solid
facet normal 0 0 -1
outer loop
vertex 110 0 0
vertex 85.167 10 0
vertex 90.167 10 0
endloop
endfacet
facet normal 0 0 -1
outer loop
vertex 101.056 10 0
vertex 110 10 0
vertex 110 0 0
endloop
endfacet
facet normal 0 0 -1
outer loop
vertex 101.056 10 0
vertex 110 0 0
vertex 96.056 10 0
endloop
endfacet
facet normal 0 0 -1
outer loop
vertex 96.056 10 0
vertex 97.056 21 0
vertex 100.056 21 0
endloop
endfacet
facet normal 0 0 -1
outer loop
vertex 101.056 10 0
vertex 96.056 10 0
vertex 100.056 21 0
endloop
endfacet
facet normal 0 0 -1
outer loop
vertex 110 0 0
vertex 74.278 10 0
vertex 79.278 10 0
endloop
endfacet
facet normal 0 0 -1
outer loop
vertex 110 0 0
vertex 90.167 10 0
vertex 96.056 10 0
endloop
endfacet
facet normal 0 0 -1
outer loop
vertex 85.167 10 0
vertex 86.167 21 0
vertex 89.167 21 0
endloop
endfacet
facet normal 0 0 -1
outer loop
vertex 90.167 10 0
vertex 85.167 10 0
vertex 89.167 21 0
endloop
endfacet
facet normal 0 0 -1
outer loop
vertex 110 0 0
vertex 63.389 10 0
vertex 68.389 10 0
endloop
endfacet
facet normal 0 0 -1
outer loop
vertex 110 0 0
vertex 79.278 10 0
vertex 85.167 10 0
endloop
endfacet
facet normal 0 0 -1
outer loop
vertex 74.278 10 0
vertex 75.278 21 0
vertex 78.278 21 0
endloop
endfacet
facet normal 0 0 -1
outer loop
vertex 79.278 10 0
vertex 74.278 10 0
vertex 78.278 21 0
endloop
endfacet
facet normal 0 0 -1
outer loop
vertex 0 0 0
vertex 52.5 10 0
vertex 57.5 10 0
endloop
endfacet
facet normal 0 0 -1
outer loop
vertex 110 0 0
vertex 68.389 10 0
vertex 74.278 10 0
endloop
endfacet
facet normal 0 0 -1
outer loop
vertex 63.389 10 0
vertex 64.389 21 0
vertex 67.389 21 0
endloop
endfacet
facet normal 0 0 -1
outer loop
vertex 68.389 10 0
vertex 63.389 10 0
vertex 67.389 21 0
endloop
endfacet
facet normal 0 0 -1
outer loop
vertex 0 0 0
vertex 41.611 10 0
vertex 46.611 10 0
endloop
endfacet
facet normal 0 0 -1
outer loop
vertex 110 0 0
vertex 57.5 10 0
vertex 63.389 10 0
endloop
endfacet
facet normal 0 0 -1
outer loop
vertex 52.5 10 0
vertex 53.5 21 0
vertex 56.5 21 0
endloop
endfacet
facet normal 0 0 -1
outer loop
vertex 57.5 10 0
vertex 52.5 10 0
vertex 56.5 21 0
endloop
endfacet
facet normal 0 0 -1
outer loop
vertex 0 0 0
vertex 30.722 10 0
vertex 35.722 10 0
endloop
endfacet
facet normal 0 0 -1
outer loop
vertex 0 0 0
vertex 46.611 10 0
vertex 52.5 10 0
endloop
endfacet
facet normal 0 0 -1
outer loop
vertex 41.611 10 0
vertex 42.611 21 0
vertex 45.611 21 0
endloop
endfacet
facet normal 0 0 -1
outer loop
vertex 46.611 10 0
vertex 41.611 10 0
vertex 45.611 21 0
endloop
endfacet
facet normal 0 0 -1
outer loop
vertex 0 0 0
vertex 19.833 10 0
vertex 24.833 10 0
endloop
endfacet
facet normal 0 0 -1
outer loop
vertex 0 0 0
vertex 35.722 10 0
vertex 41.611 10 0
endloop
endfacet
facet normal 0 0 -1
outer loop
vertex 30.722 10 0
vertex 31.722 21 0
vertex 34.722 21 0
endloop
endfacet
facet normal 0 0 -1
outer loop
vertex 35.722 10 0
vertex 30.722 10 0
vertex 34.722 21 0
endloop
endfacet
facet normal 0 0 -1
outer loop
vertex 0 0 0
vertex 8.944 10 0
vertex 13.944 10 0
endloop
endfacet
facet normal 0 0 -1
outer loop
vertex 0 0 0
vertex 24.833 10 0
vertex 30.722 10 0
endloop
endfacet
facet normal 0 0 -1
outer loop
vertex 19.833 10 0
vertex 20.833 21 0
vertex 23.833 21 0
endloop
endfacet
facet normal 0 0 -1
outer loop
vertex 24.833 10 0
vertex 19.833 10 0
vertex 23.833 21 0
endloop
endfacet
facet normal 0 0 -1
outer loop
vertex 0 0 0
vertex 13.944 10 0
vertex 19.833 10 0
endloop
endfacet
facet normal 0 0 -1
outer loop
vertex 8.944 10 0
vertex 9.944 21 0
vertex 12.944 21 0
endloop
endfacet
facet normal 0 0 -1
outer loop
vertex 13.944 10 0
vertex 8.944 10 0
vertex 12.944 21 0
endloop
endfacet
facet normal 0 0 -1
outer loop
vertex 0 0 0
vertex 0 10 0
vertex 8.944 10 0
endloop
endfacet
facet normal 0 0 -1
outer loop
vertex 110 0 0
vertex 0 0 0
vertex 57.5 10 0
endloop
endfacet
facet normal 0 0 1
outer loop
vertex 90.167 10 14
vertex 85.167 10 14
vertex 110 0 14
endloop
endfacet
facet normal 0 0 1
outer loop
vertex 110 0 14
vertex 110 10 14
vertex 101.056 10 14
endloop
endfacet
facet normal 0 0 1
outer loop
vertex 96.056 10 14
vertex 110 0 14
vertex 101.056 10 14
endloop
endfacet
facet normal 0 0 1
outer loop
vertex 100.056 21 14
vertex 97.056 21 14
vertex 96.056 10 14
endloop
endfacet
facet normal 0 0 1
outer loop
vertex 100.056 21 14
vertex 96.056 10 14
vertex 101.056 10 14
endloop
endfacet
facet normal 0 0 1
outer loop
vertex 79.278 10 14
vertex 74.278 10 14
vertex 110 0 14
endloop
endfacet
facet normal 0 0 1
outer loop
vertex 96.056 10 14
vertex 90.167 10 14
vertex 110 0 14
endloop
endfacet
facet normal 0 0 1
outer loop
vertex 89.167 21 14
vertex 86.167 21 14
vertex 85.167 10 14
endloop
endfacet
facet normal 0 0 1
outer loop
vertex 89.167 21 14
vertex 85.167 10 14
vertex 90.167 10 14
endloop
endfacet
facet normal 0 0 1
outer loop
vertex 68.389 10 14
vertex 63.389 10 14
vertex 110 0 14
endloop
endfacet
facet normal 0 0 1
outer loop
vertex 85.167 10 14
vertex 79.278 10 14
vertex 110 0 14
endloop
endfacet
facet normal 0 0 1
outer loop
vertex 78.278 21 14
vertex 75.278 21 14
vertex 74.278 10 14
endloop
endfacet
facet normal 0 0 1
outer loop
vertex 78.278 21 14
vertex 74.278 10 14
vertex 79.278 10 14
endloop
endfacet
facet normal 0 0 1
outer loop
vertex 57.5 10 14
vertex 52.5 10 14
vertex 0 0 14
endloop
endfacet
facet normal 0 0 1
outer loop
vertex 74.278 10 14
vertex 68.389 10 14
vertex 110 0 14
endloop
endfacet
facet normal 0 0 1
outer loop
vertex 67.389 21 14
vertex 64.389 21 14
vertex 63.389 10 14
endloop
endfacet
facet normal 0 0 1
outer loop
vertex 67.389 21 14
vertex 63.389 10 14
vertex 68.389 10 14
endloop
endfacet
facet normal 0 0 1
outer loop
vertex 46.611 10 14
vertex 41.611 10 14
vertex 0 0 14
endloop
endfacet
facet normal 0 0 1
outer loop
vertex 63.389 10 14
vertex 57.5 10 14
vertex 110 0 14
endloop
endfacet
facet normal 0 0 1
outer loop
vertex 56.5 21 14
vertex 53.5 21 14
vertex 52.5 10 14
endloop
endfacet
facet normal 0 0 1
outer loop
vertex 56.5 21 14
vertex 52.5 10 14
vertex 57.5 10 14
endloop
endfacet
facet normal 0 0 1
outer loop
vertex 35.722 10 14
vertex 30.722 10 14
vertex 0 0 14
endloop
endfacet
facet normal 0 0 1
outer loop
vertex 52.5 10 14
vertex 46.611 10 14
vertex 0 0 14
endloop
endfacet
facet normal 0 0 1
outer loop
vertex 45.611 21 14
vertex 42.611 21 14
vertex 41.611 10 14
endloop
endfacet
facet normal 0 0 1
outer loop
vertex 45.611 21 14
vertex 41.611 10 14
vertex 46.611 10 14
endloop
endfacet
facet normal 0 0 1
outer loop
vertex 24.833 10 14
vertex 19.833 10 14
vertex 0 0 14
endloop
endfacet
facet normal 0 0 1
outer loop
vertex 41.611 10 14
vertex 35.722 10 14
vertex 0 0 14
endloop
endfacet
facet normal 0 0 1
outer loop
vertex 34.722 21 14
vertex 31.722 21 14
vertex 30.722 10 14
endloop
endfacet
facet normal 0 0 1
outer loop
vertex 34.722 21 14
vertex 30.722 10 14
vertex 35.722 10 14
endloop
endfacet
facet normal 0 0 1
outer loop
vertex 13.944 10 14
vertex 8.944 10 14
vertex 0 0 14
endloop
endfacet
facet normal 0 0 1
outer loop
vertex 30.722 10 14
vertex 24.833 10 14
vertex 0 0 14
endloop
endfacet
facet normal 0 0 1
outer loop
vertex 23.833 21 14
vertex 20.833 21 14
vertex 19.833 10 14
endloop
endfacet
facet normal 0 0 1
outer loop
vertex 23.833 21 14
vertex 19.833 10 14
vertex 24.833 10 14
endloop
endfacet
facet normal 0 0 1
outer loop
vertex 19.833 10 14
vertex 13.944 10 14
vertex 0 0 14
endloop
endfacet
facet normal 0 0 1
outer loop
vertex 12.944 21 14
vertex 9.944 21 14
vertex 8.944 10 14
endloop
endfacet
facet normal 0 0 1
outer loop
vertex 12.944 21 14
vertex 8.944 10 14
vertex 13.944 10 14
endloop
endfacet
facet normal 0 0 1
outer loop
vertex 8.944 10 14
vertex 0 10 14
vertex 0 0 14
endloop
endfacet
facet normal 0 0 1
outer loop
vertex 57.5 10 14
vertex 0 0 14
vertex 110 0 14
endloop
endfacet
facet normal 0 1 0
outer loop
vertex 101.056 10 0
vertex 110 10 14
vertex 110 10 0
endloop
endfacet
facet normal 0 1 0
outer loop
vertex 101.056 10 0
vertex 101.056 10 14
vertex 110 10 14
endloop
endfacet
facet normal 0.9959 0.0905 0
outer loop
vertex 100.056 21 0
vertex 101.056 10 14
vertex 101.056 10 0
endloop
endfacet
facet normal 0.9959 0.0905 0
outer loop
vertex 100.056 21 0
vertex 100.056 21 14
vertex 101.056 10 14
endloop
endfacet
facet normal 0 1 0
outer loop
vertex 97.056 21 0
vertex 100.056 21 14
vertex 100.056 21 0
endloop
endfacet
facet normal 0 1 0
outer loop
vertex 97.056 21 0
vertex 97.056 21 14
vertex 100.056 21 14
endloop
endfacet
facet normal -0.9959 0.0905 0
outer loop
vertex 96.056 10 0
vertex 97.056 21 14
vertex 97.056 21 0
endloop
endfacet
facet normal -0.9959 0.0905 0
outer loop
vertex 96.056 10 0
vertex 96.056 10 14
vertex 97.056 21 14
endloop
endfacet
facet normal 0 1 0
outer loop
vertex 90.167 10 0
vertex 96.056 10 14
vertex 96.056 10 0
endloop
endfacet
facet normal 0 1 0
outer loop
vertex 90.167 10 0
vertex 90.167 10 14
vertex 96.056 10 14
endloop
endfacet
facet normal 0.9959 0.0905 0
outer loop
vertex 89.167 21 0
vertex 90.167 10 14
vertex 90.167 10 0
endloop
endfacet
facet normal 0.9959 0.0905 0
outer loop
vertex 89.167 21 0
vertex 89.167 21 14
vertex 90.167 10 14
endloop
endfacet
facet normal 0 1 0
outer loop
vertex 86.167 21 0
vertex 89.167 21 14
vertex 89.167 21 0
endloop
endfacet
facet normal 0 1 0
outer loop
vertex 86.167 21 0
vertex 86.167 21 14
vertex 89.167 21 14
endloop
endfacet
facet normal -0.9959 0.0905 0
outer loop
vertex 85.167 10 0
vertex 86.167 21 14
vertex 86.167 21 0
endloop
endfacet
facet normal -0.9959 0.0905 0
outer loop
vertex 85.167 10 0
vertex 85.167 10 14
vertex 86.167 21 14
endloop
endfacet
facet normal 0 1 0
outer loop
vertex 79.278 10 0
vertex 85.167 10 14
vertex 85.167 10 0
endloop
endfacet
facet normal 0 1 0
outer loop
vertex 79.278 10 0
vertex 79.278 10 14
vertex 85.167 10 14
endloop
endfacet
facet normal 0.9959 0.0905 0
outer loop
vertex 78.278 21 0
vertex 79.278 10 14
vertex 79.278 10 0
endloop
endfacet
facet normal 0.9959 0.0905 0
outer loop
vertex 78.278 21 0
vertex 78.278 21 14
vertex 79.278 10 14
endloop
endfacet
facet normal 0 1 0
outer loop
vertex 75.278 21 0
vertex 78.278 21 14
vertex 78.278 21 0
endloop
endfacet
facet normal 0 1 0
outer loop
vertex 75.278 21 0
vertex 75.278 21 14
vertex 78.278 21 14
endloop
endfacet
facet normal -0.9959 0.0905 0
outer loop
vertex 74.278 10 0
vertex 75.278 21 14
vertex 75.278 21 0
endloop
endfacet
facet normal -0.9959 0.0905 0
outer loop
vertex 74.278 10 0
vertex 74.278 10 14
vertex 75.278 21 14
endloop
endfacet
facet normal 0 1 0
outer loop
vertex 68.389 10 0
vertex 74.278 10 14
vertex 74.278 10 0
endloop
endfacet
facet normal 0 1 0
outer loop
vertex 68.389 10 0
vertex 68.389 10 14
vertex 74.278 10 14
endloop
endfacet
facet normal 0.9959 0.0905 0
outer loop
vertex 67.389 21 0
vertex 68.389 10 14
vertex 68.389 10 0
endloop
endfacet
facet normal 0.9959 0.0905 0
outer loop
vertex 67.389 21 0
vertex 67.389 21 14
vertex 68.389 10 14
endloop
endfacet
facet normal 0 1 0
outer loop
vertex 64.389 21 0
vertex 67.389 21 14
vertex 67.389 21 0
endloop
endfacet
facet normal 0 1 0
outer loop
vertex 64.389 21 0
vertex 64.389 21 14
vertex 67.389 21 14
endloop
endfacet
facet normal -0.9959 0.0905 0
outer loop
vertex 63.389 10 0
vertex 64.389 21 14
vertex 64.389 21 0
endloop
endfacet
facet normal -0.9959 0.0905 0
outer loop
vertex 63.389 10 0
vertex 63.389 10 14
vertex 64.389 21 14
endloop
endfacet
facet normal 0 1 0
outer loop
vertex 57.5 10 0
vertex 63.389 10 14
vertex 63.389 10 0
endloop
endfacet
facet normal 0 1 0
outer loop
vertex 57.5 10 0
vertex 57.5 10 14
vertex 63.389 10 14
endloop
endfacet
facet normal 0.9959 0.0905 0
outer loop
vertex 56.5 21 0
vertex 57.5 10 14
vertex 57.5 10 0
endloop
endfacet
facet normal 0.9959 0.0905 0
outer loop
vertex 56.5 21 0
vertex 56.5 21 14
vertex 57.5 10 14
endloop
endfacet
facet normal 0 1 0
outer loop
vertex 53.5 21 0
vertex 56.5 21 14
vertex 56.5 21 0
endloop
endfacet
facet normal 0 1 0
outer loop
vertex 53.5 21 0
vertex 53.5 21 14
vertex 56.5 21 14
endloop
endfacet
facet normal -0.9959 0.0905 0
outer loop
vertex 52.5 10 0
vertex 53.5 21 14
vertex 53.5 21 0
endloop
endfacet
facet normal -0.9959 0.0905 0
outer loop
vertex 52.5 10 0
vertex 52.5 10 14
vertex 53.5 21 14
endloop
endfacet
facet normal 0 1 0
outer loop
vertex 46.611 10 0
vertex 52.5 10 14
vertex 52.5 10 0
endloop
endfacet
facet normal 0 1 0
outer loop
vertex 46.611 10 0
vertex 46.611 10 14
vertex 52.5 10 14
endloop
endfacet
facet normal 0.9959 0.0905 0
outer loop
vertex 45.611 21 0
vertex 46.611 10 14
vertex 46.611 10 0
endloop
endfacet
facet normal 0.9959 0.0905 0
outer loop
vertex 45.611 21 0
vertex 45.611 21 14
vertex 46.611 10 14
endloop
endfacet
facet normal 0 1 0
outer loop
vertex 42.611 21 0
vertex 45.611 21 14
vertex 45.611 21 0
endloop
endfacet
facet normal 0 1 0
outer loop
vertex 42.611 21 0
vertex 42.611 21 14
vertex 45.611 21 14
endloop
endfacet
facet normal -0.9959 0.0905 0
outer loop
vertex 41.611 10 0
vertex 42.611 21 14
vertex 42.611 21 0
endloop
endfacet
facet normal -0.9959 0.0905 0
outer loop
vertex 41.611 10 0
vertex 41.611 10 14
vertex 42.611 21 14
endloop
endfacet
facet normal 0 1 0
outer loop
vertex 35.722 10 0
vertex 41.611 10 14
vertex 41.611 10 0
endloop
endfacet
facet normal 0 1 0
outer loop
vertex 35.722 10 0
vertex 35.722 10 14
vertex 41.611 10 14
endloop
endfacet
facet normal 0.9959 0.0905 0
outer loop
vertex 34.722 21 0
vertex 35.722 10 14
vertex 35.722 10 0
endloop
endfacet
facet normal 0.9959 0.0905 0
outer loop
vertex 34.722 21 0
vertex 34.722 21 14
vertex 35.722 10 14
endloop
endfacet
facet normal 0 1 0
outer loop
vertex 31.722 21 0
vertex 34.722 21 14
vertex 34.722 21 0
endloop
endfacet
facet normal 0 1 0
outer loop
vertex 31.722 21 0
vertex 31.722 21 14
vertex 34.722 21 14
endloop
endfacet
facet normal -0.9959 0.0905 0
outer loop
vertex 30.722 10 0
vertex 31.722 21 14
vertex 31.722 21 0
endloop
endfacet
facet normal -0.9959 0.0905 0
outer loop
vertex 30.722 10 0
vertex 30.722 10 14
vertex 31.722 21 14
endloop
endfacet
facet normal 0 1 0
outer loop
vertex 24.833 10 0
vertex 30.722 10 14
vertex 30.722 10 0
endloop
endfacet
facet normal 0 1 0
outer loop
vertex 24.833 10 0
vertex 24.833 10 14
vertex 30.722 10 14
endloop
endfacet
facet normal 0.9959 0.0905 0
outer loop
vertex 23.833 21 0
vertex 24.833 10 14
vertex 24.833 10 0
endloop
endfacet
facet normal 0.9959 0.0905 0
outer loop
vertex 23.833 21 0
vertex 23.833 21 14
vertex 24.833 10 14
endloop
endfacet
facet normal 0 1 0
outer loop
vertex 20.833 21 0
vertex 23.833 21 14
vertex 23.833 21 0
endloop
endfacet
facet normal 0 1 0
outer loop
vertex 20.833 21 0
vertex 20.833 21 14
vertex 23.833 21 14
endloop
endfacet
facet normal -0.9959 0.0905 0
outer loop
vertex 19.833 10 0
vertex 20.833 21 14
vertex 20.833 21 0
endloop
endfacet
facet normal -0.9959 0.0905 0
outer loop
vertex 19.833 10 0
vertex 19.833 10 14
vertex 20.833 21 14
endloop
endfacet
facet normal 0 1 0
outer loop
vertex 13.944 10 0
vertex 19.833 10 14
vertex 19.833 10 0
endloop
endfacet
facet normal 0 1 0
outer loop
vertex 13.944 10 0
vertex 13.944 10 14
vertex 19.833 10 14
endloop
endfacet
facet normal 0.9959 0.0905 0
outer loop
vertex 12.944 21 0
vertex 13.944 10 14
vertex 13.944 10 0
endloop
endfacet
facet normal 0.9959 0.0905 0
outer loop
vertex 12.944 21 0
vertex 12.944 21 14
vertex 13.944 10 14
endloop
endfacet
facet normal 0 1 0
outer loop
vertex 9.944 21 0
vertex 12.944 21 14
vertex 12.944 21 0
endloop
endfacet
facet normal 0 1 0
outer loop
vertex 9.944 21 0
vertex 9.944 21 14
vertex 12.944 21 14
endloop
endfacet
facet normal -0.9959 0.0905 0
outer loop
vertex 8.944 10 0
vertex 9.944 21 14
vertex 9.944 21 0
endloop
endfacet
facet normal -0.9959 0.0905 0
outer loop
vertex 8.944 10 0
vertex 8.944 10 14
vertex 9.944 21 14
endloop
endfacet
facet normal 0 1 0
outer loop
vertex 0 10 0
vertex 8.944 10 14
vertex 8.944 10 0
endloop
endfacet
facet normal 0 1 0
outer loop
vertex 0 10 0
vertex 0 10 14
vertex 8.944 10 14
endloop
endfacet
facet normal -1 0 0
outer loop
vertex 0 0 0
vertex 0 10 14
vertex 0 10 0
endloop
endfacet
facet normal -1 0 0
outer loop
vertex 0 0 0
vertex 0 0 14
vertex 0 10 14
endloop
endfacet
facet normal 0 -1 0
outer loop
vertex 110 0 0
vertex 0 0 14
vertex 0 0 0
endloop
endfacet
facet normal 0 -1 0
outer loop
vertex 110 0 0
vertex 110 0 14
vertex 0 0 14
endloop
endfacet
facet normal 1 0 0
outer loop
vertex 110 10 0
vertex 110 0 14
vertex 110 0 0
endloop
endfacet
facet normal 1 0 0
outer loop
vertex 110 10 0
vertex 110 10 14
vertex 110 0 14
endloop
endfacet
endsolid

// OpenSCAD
$fn = 32;

// ----------------------------------------------------------------------
// Gear rack: 9 teeth on a 110 mm bar, pitch 10.89 mm
// ----------------------------------------------------------------------

// --- parameters (mm) ---
profile_height = 14;      // extrusion height
profile_points = 40;      // points of the closed outline

profile = [[0, 0], [110, 0], [110, 10], [101.056, 10], [100.056, 21], [97.056, 21], [96.056, 10], [90.167, 10], [89.167, 21], [86.167, 21], [85.167, 10], [79.278, 10], [78.278, 21], [75.278, 21], [74.278, 10], [68.389, 10], [67.389, 21], [64.389, 21], [63.389, 10], [57.5, 10], [56.5, 21], [53.5, 21], [52.5, 10], [46.611, 10], [45.611, 21], [42.611, 21], [41.611, 10], [35.722, 10], [34.722, 21], [31.722, 21], [30.722, 10], [24.833, 10], [23.833, 21], [20.833, 21], [19.833, 10], [13.944, 10], [12.944, 21], [9.944, 21], [8.944, 10], [0, 10]];  // single closed polygon, 40 points, counter clockwise

// --- the one profile operation ---
linear_extrude(height = profile_height) polygon(points = profile);
